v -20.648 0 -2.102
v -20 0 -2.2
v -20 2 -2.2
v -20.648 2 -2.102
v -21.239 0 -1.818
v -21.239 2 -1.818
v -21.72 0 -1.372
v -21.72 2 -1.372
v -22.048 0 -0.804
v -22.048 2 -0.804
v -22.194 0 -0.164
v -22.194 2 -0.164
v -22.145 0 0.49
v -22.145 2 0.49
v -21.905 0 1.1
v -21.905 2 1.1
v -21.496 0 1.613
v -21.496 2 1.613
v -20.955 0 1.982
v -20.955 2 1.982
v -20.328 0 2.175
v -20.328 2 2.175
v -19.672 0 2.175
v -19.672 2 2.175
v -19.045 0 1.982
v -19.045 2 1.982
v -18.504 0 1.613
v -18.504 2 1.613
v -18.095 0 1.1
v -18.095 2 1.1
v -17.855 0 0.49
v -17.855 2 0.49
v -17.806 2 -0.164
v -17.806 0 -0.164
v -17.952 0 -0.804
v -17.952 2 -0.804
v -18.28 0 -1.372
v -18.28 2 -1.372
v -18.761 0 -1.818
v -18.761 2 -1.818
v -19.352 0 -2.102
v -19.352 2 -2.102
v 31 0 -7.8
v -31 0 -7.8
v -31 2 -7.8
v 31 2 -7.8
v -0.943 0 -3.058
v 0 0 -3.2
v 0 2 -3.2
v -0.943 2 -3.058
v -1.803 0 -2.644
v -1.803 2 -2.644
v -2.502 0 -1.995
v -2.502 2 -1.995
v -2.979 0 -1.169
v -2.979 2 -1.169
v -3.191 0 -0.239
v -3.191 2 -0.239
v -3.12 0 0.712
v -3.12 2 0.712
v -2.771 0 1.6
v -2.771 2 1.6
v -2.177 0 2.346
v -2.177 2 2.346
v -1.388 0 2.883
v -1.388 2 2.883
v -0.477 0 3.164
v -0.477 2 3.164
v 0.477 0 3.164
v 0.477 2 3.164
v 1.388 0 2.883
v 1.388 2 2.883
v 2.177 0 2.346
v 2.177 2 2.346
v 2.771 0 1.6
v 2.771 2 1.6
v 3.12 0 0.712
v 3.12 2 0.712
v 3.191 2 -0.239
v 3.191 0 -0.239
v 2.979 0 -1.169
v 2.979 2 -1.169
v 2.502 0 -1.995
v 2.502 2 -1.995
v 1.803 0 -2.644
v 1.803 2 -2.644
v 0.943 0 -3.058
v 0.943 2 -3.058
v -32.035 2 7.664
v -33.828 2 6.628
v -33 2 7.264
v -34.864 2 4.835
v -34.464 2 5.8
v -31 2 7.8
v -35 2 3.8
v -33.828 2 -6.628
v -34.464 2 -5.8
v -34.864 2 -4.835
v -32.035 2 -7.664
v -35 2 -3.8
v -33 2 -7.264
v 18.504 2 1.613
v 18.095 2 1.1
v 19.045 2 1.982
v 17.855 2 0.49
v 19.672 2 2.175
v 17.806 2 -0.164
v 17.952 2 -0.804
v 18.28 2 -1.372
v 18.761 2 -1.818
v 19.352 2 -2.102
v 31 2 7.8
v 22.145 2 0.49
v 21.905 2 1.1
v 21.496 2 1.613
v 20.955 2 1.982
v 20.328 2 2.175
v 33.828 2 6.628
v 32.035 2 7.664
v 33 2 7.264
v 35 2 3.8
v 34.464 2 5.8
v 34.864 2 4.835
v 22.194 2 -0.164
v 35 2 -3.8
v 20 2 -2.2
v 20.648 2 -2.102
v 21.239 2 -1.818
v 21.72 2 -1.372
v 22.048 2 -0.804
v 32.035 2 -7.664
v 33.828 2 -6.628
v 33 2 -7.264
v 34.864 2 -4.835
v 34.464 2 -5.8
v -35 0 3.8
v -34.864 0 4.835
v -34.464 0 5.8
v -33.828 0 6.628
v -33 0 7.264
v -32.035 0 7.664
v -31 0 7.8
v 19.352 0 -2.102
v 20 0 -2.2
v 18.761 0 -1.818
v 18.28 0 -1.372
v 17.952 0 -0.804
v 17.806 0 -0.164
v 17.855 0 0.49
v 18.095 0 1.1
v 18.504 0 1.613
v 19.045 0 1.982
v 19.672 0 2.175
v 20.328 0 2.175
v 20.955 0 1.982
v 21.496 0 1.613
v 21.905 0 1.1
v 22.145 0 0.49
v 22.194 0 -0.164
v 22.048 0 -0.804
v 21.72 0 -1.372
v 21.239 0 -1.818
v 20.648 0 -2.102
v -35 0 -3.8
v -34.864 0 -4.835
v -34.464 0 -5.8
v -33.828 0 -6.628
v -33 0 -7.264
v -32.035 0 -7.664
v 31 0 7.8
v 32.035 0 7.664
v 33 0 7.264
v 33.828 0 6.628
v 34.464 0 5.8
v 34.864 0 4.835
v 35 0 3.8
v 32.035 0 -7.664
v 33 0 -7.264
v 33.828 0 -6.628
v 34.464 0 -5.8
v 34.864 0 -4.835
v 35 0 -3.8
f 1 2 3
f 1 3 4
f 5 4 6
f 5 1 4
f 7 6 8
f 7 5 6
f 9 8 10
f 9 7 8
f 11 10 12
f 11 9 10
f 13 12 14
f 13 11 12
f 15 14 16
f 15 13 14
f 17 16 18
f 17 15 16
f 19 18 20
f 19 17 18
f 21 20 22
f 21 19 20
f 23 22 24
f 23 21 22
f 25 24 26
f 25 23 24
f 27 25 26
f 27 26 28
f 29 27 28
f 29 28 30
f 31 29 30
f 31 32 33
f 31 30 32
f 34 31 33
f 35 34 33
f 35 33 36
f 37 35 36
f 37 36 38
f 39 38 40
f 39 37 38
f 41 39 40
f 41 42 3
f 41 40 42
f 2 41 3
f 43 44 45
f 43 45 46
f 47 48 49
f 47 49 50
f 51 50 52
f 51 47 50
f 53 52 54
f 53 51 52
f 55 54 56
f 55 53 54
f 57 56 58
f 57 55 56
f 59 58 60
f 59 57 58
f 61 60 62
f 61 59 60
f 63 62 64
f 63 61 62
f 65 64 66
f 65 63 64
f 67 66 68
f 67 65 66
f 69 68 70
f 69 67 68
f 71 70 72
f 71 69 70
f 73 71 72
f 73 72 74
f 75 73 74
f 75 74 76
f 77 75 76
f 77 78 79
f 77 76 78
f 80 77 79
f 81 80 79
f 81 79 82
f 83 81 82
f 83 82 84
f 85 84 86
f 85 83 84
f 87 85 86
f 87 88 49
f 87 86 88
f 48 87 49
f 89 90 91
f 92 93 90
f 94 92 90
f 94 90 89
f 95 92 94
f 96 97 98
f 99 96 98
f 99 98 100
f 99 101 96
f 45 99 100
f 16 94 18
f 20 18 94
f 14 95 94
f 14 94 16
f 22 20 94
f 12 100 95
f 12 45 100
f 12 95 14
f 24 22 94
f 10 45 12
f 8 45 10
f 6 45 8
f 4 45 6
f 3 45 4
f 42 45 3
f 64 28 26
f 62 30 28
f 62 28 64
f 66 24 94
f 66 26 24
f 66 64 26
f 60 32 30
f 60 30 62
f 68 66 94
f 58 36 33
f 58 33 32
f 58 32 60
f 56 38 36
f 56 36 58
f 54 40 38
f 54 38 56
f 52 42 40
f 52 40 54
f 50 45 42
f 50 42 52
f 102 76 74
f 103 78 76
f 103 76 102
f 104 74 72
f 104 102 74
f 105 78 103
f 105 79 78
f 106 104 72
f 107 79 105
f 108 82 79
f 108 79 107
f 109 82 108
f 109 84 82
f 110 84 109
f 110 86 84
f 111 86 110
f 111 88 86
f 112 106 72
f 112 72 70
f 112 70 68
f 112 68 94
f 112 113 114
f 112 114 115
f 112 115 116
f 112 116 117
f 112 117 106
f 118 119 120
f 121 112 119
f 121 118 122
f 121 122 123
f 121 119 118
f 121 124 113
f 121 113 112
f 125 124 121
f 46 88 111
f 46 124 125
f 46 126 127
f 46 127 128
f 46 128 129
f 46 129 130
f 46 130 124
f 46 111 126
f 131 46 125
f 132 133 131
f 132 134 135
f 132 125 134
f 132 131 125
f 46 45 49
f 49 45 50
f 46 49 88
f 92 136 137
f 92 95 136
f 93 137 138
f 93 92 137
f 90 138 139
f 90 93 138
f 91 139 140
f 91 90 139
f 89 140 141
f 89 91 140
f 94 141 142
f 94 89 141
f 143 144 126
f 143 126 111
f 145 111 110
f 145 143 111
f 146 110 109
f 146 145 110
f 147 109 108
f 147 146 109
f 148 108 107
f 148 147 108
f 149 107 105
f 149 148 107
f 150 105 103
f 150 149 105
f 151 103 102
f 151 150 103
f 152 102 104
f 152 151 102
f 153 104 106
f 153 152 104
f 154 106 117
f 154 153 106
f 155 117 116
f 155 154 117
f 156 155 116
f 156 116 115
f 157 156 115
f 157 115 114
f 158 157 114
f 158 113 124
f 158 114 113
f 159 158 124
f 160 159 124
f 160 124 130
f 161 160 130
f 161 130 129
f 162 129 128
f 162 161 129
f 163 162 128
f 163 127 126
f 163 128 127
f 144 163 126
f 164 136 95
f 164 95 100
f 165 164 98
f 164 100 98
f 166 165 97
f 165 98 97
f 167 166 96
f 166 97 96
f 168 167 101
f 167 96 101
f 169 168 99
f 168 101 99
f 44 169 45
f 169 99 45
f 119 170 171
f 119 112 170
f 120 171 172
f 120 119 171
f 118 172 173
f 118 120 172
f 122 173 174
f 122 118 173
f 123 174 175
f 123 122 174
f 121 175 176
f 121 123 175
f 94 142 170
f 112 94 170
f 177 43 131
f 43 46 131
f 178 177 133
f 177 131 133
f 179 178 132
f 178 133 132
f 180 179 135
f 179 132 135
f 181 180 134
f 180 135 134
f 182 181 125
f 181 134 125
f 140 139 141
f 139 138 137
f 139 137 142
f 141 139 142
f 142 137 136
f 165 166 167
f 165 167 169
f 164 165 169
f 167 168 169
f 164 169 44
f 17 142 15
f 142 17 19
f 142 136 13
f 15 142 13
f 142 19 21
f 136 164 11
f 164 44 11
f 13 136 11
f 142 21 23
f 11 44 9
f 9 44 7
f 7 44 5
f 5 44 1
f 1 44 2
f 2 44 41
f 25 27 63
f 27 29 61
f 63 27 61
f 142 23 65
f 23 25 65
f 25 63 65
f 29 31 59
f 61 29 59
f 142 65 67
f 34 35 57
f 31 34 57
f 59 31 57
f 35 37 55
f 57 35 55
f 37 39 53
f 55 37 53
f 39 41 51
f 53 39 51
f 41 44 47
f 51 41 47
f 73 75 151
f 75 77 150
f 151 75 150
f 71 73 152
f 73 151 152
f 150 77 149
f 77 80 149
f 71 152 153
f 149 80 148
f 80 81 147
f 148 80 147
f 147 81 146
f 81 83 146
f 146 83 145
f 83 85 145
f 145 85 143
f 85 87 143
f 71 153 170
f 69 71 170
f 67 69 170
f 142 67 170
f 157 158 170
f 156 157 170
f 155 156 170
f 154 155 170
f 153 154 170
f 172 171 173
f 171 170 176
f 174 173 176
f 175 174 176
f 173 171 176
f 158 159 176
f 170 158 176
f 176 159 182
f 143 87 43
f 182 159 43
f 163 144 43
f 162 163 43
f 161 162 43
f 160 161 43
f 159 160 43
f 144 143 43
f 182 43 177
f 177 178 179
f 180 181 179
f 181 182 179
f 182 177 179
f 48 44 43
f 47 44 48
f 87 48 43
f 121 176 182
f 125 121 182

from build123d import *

# Parameters (mm, degrees)
CROQUIS1_W                 = 70
CROQUIS1_H                 = 15.6
SALIENTE_EXTRUIR1_DEPTH    = 2
CORTAR_EXTRUIR2_DEPTH      = 36.914342539
CORTAR_EXTRUIR2_DEPTH_BACK = 36.914342539
CROQUIS3_R                 = 3.2
CROQUIS3_R_2               = 2.2
REDONDEO1_R                = 4


with BuildPart() as part:
    # Croquis1 → Saliente-Extruir1 (new body)
    with BuildSketch(Plane(origin=(0, 0, 0), x_dir=(1, 0, 0), z_dir=(0, 1, 0))):
        Rectangle(CROQUIS1_W, CROQUIS1_H)
    extrude(amount=SALIENTE_EXTRUIR1_DEPTH)

    # Croquis3 → Cortar-Extruir2 (cut, two sides: drawn at the far end of the back side and taken through both)
    with BuildSketch(Plane(origin=(0, 0, 0), x_dir=(1, 0, 0), z_dir=(0, 1, 0)).offset(-CORTAR_EXTRUIR2_DEPTH_BACK)):
        with Locations(Location((0, 0, 0), (0, 0, 90))):
            Circle(CROQUIS3_R)
        with Locations(Location((20, 0, 0), (0, 0, 90))):
            Circle(CROQUIS3_R_2)
        with Locations(Location((-20, 0, 0), (0, 0, 90))):
            Circle(CROQUIS3_R_2)
    extrude(amount=CORTAR_EXTRUIR2_DEPTH + CORTAR_EXTRUIR2_DEPTH_BACK, mode=Mode.SUBTRACT)

    # Redondeo1
    redondeo1_edges = [part.edges().sort_by_distance(p)[0] for p in [
        (35, 1, 7.8),
        (-35, 1, 7.8),
        (-35, 1, -7.8),
        (35, 1, -7.8),
    ]]
    fillet(redondeo1_edges, radius=REDONDEO1_R)


solid = part.part
